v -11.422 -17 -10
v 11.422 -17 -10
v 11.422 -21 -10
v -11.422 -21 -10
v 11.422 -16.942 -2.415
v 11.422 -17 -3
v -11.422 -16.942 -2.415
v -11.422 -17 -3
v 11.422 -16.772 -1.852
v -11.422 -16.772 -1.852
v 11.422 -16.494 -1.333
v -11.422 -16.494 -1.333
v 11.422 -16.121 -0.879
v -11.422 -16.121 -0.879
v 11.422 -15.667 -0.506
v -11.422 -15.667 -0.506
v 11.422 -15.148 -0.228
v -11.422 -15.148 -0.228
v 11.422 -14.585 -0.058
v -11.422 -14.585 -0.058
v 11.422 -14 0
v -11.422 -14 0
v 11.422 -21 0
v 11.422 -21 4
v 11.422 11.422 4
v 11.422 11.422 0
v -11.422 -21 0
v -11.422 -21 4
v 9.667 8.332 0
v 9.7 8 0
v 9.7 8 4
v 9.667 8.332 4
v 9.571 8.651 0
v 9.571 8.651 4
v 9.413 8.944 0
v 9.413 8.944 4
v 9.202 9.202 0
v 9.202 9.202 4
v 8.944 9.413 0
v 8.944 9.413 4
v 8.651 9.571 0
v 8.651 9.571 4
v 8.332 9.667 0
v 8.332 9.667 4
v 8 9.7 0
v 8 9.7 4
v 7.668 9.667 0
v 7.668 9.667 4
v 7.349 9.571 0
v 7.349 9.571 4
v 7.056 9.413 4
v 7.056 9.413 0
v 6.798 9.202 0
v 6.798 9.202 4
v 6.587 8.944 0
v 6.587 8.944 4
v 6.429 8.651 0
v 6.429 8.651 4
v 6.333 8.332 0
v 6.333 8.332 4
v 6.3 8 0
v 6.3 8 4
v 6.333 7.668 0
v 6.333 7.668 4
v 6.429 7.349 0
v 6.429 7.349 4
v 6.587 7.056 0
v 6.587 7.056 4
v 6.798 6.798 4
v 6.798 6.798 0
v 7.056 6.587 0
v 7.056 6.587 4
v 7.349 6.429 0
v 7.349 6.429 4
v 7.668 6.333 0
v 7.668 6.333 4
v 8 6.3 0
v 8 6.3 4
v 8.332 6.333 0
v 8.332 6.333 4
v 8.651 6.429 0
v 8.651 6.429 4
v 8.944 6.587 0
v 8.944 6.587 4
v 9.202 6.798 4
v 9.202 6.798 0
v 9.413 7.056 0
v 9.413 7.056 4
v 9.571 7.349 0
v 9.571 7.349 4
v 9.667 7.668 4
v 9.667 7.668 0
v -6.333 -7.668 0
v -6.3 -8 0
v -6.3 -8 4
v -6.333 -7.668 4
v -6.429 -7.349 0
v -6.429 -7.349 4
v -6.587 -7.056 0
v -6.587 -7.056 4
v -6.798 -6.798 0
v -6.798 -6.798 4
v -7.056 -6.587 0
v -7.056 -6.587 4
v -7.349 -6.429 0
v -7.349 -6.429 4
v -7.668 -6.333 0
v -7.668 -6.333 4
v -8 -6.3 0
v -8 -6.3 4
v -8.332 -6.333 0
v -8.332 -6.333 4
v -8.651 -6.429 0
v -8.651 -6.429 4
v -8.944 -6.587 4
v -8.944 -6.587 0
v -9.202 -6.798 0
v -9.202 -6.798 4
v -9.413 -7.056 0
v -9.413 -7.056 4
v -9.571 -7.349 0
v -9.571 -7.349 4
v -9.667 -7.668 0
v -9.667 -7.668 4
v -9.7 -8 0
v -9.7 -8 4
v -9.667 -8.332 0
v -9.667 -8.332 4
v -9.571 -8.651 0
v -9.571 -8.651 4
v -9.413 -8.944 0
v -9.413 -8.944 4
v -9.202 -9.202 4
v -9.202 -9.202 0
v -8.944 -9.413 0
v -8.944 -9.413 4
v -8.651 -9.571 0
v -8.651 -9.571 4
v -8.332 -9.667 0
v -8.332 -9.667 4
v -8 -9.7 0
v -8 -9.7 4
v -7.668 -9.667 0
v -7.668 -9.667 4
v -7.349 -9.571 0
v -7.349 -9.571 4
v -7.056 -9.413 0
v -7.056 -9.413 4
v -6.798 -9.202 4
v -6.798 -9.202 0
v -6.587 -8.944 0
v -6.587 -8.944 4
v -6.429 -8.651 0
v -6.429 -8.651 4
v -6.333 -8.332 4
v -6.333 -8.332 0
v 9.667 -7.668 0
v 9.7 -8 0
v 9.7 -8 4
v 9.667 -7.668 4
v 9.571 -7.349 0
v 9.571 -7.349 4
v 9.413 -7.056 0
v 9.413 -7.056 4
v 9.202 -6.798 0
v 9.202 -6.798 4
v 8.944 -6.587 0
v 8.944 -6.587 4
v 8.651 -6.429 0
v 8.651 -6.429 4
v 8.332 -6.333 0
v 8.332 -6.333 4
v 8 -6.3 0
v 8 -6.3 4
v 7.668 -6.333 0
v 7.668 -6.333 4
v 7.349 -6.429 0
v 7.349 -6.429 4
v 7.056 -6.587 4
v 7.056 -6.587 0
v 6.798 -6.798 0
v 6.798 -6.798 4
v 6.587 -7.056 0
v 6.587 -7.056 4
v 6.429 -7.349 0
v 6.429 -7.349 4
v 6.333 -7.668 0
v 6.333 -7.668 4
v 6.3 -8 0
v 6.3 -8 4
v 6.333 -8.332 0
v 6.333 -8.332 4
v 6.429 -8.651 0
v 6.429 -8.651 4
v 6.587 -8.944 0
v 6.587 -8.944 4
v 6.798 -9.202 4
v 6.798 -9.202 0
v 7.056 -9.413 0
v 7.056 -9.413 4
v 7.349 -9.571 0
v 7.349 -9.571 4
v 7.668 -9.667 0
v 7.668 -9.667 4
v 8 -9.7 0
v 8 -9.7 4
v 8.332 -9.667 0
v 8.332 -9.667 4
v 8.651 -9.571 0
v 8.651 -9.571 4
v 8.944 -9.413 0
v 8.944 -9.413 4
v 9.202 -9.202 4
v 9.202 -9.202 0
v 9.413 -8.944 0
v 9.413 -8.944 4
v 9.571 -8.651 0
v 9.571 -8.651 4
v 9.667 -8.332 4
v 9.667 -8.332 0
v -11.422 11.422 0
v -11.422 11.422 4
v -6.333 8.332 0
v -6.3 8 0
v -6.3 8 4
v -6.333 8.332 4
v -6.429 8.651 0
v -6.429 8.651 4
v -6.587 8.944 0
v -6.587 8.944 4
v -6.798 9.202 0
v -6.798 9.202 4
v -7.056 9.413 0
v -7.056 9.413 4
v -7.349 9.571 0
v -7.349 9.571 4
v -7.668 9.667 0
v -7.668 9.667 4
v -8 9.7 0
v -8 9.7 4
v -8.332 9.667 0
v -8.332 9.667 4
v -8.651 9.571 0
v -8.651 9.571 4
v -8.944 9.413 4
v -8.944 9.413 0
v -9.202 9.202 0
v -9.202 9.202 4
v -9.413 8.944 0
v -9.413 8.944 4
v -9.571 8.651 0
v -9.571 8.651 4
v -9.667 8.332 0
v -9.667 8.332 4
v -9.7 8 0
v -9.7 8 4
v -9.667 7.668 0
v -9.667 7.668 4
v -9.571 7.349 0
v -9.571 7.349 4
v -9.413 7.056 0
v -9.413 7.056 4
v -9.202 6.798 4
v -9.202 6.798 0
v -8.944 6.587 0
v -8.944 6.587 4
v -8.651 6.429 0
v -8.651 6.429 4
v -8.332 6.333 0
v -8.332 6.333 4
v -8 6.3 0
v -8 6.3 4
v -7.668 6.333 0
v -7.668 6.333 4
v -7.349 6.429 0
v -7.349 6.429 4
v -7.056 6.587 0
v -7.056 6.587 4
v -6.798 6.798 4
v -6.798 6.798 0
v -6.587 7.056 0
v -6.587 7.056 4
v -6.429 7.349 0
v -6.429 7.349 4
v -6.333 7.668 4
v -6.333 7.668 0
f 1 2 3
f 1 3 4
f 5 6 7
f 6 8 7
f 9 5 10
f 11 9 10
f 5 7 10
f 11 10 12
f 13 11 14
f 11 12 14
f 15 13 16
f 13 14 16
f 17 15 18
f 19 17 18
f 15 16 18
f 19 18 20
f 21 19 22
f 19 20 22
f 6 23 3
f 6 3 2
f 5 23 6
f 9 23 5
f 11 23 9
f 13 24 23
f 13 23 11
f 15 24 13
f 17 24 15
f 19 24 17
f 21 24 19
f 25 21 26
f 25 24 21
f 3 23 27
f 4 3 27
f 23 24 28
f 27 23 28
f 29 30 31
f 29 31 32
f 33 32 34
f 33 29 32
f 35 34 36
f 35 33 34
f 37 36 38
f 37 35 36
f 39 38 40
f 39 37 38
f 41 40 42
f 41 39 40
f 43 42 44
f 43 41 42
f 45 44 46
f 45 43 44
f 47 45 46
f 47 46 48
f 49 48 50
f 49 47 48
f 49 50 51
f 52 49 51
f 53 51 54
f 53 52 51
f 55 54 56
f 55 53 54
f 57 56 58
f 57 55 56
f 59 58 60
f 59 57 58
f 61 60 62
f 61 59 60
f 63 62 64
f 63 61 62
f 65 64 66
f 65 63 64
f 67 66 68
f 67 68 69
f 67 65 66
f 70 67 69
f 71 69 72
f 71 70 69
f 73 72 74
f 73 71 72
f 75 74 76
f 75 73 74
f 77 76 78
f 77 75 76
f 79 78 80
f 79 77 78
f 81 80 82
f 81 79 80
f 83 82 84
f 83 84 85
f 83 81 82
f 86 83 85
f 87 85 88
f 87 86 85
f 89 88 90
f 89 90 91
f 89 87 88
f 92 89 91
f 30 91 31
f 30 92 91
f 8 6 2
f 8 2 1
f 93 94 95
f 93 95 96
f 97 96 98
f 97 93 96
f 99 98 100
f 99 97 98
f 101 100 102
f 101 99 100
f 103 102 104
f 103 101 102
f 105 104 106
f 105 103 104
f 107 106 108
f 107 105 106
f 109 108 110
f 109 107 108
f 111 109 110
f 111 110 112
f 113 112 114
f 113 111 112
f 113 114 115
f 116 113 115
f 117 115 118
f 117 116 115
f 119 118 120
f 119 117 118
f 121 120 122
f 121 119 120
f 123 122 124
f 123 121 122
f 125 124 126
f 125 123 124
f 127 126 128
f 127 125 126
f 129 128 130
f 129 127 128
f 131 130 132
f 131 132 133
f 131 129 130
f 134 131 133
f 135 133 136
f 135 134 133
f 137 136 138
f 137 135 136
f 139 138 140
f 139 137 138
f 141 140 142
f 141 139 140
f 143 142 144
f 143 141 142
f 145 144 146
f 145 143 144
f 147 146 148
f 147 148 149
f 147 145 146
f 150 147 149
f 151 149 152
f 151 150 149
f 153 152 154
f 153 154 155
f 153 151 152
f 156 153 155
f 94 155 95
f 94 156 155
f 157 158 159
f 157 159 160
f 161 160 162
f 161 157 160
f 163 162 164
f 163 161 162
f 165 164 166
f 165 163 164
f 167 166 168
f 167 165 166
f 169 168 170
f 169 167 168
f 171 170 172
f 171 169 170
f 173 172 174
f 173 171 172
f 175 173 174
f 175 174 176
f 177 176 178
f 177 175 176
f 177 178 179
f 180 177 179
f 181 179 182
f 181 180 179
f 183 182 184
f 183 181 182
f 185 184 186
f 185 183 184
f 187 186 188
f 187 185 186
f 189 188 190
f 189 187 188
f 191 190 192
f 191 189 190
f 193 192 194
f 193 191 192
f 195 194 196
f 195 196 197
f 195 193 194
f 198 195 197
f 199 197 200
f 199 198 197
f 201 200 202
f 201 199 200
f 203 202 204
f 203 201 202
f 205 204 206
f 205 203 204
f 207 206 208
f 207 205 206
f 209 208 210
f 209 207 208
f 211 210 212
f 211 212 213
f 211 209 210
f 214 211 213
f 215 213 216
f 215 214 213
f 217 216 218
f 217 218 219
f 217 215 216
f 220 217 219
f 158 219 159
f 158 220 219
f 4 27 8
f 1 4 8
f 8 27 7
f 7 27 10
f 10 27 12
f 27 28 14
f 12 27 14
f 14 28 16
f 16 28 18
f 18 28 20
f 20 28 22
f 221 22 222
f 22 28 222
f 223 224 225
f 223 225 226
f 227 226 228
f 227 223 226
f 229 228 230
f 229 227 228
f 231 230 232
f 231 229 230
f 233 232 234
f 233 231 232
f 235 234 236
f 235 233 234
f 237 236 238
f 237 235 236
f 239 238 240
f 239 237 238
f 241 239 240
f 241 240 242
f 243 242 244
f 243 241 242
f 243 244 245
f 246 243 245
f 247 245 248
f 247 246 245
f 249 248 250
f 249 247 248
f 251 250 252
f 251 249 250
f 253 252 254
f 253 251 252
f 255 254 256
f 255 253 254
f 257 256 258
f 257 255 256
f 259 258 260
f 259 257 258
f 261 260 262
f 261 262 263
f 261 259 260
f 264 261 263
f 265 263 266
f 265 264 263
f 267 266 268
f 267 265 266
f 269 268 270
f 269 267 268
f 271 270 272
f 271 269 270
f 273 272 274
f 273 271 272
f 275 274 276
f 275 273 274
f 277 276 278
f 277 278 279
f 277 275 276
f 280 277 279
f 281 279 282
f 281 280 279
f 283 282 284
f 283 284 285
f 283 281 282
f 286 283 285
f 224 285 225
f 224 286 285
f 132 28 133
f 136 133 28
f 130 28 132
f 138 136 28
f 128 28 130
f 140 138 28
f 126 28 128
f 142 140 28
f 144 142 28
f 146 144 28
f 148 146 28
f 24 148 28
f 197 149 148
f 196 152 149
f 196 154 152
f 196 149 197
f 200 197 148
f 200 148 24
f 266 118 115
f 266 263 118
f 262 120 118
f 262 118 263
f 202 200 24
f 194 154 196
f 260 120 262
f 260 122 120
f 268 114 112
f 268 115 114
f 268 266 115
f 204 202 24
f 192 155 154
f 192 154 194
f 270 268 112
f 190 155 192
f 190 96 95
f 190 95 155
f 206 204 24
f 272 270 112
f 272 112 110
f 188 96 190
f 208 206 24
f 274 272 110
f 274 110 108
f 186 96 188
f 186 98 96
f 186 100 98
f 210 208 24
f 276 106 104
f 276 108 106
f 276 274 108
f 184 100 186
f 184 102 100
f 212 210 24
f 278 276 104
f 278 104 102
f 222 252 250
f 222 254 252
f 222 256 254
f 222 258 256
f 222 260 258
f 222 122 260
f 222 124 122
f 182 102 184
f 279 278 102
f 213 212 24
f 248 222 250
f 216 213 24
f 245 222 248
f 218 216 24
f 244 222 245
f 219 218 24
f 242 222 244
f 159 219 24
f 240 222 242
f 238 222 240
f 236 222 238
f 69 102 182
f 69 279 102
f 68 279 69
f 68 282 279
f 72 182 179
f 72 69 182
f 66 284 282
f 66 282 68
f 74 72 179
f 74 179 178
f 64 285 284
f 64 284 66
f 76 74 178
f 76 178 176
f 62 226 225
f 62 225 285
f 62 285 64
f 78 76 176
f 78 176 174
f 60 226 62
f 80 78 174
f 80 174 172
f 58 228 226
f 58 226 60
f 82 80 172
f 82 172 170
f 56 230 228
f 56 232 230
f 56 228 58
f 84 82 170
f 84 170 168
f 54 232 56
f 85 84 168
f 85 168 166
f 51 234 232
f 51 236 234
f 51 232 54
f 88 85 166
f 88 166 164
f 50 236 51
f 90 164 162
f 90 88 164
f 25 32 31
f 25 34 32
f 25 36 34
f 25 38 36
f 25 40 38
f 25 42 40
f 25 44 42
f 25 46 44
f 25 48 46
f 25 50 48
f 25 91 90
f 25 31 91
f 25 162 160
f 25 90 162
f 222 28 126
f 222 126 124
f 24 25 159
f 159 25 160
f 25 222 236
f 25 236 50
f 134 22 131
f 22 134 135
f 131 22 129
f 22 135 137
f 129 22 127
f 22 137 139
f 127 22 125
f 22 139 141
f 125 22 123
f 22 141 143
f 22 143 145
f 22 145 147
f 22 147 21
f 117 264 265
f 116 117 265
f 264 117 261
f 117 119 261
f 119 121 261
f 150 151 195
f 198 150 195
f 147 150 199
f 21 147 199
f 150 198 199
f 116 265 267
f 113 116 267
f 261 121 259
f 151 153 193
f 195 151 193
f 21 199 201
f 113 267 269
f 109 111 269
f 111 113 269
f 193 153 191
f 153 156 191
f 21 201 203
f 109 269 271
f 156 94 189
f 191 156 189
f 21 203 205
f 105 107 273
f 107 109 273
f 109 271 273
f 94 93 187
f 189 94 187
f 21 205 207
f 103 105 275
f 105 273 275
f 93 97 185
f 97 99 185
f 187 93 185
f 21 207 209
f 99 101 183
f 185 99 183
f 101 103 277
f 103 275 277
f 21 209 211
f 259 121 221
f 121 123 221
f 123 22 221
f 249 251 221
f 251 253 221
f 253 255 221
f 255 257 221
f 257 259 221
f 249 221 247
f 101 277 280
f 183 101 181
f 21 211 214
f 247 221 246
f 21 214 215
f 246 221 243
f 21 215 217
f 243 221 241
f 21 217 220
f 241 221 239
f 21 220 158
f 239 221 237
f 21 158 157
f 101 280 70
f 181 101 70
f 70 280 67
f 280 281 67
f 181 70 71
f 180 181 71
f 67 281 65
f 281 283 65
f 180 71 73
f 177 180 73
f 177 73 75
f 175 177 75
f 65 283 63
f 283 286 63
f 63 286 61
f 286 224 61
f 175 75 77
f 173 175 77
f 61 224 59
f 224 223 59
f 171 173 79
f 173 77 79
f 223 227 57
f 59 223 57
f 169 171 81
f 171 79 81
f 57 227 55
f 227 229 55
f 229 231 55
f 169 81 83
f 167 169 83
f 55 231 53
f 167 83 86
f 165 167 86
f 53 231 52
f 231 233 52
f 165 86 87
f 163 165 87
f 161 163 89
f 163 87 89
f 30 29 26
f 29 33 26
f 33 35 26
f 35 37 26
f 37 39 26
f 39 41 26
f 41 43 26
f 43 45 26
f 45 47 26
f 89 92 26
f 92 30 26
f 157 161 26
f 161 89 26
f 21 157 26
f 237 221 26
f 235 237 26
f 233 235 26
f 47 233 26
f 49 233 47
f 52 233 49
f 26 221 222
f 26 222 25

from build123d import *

# Parameters (mm, degrees)
SKETCH1_W           = 22.84372425
SKETCH1_H           = 22.84372425
SKETCH1_R           = 1.7
BOSS_EXTRUDE1_DEPTH = 4
SKETCH2_W           = 22.84372425
SKETCH2_H           = 9.578137875
BOSS_EXTRUDE2_DEPTH = 4
SKETCH3_W           = 22.84372425
SKETCH3_H           = 4
BOSS_EXTRUDE3_DEPTH = 10
FILLET1_R           = 3


with BuildPart() as part:
    # Sketch1 → Boss-Extrude1 (new body)
    with BuildSketch(Plane.XY):
        Rectangle(SKETCH1_W, SKETCH1_H)
        with Locations((-8, 8)):
            Circle(SKETCH1_R, mode=Mode.SUBTRACT)
        with Locations((8, 8)):
            Circle(SKETCH1_R, mode=Mode.SUBTRACT)
        with Locations((8, -8)):
            Circle(SKETCH1_R, mode=Mode.SUBTRACT)
        with Locations((-8, -8)):
            Circle(SKETCH1_R, mode=Mode.SUBTRACT)
    extrude(amount=BOSS_EXTRUDE1_DEPTH)

    # Sketch2 → Boss-Extrude2 (add)
    with BuildSketch(Plane.XY):
        with Locations((0, -16.210931063)):
            Rectangle(SKETCH2_W, SKETCH2_H)
    extrude(amount=BOSS_EXTRUDE2_DEPTH)

    # Sketch3 → Boss-Extrude3 (add)
    with BuildSketch(Plane(origin=(0, 0, 0), x_dir=(-1, 0, 0), z_dir=(0, 0, -1))):
        with Locations((0, -19)):
            Rectangle(SKETCH3_W, SKETCH3_H)
    extrude(amount=BOSS_EXTRUDE3_DEPTH)

    # Fillet1
    fillet1_edges = [part.edges().sort_by_distance(p)[0] for p in [
        (0, -17, 0),
    ]]
    fillet(fillet1_edges, radius=FILLET1_R)


solid = part.part
